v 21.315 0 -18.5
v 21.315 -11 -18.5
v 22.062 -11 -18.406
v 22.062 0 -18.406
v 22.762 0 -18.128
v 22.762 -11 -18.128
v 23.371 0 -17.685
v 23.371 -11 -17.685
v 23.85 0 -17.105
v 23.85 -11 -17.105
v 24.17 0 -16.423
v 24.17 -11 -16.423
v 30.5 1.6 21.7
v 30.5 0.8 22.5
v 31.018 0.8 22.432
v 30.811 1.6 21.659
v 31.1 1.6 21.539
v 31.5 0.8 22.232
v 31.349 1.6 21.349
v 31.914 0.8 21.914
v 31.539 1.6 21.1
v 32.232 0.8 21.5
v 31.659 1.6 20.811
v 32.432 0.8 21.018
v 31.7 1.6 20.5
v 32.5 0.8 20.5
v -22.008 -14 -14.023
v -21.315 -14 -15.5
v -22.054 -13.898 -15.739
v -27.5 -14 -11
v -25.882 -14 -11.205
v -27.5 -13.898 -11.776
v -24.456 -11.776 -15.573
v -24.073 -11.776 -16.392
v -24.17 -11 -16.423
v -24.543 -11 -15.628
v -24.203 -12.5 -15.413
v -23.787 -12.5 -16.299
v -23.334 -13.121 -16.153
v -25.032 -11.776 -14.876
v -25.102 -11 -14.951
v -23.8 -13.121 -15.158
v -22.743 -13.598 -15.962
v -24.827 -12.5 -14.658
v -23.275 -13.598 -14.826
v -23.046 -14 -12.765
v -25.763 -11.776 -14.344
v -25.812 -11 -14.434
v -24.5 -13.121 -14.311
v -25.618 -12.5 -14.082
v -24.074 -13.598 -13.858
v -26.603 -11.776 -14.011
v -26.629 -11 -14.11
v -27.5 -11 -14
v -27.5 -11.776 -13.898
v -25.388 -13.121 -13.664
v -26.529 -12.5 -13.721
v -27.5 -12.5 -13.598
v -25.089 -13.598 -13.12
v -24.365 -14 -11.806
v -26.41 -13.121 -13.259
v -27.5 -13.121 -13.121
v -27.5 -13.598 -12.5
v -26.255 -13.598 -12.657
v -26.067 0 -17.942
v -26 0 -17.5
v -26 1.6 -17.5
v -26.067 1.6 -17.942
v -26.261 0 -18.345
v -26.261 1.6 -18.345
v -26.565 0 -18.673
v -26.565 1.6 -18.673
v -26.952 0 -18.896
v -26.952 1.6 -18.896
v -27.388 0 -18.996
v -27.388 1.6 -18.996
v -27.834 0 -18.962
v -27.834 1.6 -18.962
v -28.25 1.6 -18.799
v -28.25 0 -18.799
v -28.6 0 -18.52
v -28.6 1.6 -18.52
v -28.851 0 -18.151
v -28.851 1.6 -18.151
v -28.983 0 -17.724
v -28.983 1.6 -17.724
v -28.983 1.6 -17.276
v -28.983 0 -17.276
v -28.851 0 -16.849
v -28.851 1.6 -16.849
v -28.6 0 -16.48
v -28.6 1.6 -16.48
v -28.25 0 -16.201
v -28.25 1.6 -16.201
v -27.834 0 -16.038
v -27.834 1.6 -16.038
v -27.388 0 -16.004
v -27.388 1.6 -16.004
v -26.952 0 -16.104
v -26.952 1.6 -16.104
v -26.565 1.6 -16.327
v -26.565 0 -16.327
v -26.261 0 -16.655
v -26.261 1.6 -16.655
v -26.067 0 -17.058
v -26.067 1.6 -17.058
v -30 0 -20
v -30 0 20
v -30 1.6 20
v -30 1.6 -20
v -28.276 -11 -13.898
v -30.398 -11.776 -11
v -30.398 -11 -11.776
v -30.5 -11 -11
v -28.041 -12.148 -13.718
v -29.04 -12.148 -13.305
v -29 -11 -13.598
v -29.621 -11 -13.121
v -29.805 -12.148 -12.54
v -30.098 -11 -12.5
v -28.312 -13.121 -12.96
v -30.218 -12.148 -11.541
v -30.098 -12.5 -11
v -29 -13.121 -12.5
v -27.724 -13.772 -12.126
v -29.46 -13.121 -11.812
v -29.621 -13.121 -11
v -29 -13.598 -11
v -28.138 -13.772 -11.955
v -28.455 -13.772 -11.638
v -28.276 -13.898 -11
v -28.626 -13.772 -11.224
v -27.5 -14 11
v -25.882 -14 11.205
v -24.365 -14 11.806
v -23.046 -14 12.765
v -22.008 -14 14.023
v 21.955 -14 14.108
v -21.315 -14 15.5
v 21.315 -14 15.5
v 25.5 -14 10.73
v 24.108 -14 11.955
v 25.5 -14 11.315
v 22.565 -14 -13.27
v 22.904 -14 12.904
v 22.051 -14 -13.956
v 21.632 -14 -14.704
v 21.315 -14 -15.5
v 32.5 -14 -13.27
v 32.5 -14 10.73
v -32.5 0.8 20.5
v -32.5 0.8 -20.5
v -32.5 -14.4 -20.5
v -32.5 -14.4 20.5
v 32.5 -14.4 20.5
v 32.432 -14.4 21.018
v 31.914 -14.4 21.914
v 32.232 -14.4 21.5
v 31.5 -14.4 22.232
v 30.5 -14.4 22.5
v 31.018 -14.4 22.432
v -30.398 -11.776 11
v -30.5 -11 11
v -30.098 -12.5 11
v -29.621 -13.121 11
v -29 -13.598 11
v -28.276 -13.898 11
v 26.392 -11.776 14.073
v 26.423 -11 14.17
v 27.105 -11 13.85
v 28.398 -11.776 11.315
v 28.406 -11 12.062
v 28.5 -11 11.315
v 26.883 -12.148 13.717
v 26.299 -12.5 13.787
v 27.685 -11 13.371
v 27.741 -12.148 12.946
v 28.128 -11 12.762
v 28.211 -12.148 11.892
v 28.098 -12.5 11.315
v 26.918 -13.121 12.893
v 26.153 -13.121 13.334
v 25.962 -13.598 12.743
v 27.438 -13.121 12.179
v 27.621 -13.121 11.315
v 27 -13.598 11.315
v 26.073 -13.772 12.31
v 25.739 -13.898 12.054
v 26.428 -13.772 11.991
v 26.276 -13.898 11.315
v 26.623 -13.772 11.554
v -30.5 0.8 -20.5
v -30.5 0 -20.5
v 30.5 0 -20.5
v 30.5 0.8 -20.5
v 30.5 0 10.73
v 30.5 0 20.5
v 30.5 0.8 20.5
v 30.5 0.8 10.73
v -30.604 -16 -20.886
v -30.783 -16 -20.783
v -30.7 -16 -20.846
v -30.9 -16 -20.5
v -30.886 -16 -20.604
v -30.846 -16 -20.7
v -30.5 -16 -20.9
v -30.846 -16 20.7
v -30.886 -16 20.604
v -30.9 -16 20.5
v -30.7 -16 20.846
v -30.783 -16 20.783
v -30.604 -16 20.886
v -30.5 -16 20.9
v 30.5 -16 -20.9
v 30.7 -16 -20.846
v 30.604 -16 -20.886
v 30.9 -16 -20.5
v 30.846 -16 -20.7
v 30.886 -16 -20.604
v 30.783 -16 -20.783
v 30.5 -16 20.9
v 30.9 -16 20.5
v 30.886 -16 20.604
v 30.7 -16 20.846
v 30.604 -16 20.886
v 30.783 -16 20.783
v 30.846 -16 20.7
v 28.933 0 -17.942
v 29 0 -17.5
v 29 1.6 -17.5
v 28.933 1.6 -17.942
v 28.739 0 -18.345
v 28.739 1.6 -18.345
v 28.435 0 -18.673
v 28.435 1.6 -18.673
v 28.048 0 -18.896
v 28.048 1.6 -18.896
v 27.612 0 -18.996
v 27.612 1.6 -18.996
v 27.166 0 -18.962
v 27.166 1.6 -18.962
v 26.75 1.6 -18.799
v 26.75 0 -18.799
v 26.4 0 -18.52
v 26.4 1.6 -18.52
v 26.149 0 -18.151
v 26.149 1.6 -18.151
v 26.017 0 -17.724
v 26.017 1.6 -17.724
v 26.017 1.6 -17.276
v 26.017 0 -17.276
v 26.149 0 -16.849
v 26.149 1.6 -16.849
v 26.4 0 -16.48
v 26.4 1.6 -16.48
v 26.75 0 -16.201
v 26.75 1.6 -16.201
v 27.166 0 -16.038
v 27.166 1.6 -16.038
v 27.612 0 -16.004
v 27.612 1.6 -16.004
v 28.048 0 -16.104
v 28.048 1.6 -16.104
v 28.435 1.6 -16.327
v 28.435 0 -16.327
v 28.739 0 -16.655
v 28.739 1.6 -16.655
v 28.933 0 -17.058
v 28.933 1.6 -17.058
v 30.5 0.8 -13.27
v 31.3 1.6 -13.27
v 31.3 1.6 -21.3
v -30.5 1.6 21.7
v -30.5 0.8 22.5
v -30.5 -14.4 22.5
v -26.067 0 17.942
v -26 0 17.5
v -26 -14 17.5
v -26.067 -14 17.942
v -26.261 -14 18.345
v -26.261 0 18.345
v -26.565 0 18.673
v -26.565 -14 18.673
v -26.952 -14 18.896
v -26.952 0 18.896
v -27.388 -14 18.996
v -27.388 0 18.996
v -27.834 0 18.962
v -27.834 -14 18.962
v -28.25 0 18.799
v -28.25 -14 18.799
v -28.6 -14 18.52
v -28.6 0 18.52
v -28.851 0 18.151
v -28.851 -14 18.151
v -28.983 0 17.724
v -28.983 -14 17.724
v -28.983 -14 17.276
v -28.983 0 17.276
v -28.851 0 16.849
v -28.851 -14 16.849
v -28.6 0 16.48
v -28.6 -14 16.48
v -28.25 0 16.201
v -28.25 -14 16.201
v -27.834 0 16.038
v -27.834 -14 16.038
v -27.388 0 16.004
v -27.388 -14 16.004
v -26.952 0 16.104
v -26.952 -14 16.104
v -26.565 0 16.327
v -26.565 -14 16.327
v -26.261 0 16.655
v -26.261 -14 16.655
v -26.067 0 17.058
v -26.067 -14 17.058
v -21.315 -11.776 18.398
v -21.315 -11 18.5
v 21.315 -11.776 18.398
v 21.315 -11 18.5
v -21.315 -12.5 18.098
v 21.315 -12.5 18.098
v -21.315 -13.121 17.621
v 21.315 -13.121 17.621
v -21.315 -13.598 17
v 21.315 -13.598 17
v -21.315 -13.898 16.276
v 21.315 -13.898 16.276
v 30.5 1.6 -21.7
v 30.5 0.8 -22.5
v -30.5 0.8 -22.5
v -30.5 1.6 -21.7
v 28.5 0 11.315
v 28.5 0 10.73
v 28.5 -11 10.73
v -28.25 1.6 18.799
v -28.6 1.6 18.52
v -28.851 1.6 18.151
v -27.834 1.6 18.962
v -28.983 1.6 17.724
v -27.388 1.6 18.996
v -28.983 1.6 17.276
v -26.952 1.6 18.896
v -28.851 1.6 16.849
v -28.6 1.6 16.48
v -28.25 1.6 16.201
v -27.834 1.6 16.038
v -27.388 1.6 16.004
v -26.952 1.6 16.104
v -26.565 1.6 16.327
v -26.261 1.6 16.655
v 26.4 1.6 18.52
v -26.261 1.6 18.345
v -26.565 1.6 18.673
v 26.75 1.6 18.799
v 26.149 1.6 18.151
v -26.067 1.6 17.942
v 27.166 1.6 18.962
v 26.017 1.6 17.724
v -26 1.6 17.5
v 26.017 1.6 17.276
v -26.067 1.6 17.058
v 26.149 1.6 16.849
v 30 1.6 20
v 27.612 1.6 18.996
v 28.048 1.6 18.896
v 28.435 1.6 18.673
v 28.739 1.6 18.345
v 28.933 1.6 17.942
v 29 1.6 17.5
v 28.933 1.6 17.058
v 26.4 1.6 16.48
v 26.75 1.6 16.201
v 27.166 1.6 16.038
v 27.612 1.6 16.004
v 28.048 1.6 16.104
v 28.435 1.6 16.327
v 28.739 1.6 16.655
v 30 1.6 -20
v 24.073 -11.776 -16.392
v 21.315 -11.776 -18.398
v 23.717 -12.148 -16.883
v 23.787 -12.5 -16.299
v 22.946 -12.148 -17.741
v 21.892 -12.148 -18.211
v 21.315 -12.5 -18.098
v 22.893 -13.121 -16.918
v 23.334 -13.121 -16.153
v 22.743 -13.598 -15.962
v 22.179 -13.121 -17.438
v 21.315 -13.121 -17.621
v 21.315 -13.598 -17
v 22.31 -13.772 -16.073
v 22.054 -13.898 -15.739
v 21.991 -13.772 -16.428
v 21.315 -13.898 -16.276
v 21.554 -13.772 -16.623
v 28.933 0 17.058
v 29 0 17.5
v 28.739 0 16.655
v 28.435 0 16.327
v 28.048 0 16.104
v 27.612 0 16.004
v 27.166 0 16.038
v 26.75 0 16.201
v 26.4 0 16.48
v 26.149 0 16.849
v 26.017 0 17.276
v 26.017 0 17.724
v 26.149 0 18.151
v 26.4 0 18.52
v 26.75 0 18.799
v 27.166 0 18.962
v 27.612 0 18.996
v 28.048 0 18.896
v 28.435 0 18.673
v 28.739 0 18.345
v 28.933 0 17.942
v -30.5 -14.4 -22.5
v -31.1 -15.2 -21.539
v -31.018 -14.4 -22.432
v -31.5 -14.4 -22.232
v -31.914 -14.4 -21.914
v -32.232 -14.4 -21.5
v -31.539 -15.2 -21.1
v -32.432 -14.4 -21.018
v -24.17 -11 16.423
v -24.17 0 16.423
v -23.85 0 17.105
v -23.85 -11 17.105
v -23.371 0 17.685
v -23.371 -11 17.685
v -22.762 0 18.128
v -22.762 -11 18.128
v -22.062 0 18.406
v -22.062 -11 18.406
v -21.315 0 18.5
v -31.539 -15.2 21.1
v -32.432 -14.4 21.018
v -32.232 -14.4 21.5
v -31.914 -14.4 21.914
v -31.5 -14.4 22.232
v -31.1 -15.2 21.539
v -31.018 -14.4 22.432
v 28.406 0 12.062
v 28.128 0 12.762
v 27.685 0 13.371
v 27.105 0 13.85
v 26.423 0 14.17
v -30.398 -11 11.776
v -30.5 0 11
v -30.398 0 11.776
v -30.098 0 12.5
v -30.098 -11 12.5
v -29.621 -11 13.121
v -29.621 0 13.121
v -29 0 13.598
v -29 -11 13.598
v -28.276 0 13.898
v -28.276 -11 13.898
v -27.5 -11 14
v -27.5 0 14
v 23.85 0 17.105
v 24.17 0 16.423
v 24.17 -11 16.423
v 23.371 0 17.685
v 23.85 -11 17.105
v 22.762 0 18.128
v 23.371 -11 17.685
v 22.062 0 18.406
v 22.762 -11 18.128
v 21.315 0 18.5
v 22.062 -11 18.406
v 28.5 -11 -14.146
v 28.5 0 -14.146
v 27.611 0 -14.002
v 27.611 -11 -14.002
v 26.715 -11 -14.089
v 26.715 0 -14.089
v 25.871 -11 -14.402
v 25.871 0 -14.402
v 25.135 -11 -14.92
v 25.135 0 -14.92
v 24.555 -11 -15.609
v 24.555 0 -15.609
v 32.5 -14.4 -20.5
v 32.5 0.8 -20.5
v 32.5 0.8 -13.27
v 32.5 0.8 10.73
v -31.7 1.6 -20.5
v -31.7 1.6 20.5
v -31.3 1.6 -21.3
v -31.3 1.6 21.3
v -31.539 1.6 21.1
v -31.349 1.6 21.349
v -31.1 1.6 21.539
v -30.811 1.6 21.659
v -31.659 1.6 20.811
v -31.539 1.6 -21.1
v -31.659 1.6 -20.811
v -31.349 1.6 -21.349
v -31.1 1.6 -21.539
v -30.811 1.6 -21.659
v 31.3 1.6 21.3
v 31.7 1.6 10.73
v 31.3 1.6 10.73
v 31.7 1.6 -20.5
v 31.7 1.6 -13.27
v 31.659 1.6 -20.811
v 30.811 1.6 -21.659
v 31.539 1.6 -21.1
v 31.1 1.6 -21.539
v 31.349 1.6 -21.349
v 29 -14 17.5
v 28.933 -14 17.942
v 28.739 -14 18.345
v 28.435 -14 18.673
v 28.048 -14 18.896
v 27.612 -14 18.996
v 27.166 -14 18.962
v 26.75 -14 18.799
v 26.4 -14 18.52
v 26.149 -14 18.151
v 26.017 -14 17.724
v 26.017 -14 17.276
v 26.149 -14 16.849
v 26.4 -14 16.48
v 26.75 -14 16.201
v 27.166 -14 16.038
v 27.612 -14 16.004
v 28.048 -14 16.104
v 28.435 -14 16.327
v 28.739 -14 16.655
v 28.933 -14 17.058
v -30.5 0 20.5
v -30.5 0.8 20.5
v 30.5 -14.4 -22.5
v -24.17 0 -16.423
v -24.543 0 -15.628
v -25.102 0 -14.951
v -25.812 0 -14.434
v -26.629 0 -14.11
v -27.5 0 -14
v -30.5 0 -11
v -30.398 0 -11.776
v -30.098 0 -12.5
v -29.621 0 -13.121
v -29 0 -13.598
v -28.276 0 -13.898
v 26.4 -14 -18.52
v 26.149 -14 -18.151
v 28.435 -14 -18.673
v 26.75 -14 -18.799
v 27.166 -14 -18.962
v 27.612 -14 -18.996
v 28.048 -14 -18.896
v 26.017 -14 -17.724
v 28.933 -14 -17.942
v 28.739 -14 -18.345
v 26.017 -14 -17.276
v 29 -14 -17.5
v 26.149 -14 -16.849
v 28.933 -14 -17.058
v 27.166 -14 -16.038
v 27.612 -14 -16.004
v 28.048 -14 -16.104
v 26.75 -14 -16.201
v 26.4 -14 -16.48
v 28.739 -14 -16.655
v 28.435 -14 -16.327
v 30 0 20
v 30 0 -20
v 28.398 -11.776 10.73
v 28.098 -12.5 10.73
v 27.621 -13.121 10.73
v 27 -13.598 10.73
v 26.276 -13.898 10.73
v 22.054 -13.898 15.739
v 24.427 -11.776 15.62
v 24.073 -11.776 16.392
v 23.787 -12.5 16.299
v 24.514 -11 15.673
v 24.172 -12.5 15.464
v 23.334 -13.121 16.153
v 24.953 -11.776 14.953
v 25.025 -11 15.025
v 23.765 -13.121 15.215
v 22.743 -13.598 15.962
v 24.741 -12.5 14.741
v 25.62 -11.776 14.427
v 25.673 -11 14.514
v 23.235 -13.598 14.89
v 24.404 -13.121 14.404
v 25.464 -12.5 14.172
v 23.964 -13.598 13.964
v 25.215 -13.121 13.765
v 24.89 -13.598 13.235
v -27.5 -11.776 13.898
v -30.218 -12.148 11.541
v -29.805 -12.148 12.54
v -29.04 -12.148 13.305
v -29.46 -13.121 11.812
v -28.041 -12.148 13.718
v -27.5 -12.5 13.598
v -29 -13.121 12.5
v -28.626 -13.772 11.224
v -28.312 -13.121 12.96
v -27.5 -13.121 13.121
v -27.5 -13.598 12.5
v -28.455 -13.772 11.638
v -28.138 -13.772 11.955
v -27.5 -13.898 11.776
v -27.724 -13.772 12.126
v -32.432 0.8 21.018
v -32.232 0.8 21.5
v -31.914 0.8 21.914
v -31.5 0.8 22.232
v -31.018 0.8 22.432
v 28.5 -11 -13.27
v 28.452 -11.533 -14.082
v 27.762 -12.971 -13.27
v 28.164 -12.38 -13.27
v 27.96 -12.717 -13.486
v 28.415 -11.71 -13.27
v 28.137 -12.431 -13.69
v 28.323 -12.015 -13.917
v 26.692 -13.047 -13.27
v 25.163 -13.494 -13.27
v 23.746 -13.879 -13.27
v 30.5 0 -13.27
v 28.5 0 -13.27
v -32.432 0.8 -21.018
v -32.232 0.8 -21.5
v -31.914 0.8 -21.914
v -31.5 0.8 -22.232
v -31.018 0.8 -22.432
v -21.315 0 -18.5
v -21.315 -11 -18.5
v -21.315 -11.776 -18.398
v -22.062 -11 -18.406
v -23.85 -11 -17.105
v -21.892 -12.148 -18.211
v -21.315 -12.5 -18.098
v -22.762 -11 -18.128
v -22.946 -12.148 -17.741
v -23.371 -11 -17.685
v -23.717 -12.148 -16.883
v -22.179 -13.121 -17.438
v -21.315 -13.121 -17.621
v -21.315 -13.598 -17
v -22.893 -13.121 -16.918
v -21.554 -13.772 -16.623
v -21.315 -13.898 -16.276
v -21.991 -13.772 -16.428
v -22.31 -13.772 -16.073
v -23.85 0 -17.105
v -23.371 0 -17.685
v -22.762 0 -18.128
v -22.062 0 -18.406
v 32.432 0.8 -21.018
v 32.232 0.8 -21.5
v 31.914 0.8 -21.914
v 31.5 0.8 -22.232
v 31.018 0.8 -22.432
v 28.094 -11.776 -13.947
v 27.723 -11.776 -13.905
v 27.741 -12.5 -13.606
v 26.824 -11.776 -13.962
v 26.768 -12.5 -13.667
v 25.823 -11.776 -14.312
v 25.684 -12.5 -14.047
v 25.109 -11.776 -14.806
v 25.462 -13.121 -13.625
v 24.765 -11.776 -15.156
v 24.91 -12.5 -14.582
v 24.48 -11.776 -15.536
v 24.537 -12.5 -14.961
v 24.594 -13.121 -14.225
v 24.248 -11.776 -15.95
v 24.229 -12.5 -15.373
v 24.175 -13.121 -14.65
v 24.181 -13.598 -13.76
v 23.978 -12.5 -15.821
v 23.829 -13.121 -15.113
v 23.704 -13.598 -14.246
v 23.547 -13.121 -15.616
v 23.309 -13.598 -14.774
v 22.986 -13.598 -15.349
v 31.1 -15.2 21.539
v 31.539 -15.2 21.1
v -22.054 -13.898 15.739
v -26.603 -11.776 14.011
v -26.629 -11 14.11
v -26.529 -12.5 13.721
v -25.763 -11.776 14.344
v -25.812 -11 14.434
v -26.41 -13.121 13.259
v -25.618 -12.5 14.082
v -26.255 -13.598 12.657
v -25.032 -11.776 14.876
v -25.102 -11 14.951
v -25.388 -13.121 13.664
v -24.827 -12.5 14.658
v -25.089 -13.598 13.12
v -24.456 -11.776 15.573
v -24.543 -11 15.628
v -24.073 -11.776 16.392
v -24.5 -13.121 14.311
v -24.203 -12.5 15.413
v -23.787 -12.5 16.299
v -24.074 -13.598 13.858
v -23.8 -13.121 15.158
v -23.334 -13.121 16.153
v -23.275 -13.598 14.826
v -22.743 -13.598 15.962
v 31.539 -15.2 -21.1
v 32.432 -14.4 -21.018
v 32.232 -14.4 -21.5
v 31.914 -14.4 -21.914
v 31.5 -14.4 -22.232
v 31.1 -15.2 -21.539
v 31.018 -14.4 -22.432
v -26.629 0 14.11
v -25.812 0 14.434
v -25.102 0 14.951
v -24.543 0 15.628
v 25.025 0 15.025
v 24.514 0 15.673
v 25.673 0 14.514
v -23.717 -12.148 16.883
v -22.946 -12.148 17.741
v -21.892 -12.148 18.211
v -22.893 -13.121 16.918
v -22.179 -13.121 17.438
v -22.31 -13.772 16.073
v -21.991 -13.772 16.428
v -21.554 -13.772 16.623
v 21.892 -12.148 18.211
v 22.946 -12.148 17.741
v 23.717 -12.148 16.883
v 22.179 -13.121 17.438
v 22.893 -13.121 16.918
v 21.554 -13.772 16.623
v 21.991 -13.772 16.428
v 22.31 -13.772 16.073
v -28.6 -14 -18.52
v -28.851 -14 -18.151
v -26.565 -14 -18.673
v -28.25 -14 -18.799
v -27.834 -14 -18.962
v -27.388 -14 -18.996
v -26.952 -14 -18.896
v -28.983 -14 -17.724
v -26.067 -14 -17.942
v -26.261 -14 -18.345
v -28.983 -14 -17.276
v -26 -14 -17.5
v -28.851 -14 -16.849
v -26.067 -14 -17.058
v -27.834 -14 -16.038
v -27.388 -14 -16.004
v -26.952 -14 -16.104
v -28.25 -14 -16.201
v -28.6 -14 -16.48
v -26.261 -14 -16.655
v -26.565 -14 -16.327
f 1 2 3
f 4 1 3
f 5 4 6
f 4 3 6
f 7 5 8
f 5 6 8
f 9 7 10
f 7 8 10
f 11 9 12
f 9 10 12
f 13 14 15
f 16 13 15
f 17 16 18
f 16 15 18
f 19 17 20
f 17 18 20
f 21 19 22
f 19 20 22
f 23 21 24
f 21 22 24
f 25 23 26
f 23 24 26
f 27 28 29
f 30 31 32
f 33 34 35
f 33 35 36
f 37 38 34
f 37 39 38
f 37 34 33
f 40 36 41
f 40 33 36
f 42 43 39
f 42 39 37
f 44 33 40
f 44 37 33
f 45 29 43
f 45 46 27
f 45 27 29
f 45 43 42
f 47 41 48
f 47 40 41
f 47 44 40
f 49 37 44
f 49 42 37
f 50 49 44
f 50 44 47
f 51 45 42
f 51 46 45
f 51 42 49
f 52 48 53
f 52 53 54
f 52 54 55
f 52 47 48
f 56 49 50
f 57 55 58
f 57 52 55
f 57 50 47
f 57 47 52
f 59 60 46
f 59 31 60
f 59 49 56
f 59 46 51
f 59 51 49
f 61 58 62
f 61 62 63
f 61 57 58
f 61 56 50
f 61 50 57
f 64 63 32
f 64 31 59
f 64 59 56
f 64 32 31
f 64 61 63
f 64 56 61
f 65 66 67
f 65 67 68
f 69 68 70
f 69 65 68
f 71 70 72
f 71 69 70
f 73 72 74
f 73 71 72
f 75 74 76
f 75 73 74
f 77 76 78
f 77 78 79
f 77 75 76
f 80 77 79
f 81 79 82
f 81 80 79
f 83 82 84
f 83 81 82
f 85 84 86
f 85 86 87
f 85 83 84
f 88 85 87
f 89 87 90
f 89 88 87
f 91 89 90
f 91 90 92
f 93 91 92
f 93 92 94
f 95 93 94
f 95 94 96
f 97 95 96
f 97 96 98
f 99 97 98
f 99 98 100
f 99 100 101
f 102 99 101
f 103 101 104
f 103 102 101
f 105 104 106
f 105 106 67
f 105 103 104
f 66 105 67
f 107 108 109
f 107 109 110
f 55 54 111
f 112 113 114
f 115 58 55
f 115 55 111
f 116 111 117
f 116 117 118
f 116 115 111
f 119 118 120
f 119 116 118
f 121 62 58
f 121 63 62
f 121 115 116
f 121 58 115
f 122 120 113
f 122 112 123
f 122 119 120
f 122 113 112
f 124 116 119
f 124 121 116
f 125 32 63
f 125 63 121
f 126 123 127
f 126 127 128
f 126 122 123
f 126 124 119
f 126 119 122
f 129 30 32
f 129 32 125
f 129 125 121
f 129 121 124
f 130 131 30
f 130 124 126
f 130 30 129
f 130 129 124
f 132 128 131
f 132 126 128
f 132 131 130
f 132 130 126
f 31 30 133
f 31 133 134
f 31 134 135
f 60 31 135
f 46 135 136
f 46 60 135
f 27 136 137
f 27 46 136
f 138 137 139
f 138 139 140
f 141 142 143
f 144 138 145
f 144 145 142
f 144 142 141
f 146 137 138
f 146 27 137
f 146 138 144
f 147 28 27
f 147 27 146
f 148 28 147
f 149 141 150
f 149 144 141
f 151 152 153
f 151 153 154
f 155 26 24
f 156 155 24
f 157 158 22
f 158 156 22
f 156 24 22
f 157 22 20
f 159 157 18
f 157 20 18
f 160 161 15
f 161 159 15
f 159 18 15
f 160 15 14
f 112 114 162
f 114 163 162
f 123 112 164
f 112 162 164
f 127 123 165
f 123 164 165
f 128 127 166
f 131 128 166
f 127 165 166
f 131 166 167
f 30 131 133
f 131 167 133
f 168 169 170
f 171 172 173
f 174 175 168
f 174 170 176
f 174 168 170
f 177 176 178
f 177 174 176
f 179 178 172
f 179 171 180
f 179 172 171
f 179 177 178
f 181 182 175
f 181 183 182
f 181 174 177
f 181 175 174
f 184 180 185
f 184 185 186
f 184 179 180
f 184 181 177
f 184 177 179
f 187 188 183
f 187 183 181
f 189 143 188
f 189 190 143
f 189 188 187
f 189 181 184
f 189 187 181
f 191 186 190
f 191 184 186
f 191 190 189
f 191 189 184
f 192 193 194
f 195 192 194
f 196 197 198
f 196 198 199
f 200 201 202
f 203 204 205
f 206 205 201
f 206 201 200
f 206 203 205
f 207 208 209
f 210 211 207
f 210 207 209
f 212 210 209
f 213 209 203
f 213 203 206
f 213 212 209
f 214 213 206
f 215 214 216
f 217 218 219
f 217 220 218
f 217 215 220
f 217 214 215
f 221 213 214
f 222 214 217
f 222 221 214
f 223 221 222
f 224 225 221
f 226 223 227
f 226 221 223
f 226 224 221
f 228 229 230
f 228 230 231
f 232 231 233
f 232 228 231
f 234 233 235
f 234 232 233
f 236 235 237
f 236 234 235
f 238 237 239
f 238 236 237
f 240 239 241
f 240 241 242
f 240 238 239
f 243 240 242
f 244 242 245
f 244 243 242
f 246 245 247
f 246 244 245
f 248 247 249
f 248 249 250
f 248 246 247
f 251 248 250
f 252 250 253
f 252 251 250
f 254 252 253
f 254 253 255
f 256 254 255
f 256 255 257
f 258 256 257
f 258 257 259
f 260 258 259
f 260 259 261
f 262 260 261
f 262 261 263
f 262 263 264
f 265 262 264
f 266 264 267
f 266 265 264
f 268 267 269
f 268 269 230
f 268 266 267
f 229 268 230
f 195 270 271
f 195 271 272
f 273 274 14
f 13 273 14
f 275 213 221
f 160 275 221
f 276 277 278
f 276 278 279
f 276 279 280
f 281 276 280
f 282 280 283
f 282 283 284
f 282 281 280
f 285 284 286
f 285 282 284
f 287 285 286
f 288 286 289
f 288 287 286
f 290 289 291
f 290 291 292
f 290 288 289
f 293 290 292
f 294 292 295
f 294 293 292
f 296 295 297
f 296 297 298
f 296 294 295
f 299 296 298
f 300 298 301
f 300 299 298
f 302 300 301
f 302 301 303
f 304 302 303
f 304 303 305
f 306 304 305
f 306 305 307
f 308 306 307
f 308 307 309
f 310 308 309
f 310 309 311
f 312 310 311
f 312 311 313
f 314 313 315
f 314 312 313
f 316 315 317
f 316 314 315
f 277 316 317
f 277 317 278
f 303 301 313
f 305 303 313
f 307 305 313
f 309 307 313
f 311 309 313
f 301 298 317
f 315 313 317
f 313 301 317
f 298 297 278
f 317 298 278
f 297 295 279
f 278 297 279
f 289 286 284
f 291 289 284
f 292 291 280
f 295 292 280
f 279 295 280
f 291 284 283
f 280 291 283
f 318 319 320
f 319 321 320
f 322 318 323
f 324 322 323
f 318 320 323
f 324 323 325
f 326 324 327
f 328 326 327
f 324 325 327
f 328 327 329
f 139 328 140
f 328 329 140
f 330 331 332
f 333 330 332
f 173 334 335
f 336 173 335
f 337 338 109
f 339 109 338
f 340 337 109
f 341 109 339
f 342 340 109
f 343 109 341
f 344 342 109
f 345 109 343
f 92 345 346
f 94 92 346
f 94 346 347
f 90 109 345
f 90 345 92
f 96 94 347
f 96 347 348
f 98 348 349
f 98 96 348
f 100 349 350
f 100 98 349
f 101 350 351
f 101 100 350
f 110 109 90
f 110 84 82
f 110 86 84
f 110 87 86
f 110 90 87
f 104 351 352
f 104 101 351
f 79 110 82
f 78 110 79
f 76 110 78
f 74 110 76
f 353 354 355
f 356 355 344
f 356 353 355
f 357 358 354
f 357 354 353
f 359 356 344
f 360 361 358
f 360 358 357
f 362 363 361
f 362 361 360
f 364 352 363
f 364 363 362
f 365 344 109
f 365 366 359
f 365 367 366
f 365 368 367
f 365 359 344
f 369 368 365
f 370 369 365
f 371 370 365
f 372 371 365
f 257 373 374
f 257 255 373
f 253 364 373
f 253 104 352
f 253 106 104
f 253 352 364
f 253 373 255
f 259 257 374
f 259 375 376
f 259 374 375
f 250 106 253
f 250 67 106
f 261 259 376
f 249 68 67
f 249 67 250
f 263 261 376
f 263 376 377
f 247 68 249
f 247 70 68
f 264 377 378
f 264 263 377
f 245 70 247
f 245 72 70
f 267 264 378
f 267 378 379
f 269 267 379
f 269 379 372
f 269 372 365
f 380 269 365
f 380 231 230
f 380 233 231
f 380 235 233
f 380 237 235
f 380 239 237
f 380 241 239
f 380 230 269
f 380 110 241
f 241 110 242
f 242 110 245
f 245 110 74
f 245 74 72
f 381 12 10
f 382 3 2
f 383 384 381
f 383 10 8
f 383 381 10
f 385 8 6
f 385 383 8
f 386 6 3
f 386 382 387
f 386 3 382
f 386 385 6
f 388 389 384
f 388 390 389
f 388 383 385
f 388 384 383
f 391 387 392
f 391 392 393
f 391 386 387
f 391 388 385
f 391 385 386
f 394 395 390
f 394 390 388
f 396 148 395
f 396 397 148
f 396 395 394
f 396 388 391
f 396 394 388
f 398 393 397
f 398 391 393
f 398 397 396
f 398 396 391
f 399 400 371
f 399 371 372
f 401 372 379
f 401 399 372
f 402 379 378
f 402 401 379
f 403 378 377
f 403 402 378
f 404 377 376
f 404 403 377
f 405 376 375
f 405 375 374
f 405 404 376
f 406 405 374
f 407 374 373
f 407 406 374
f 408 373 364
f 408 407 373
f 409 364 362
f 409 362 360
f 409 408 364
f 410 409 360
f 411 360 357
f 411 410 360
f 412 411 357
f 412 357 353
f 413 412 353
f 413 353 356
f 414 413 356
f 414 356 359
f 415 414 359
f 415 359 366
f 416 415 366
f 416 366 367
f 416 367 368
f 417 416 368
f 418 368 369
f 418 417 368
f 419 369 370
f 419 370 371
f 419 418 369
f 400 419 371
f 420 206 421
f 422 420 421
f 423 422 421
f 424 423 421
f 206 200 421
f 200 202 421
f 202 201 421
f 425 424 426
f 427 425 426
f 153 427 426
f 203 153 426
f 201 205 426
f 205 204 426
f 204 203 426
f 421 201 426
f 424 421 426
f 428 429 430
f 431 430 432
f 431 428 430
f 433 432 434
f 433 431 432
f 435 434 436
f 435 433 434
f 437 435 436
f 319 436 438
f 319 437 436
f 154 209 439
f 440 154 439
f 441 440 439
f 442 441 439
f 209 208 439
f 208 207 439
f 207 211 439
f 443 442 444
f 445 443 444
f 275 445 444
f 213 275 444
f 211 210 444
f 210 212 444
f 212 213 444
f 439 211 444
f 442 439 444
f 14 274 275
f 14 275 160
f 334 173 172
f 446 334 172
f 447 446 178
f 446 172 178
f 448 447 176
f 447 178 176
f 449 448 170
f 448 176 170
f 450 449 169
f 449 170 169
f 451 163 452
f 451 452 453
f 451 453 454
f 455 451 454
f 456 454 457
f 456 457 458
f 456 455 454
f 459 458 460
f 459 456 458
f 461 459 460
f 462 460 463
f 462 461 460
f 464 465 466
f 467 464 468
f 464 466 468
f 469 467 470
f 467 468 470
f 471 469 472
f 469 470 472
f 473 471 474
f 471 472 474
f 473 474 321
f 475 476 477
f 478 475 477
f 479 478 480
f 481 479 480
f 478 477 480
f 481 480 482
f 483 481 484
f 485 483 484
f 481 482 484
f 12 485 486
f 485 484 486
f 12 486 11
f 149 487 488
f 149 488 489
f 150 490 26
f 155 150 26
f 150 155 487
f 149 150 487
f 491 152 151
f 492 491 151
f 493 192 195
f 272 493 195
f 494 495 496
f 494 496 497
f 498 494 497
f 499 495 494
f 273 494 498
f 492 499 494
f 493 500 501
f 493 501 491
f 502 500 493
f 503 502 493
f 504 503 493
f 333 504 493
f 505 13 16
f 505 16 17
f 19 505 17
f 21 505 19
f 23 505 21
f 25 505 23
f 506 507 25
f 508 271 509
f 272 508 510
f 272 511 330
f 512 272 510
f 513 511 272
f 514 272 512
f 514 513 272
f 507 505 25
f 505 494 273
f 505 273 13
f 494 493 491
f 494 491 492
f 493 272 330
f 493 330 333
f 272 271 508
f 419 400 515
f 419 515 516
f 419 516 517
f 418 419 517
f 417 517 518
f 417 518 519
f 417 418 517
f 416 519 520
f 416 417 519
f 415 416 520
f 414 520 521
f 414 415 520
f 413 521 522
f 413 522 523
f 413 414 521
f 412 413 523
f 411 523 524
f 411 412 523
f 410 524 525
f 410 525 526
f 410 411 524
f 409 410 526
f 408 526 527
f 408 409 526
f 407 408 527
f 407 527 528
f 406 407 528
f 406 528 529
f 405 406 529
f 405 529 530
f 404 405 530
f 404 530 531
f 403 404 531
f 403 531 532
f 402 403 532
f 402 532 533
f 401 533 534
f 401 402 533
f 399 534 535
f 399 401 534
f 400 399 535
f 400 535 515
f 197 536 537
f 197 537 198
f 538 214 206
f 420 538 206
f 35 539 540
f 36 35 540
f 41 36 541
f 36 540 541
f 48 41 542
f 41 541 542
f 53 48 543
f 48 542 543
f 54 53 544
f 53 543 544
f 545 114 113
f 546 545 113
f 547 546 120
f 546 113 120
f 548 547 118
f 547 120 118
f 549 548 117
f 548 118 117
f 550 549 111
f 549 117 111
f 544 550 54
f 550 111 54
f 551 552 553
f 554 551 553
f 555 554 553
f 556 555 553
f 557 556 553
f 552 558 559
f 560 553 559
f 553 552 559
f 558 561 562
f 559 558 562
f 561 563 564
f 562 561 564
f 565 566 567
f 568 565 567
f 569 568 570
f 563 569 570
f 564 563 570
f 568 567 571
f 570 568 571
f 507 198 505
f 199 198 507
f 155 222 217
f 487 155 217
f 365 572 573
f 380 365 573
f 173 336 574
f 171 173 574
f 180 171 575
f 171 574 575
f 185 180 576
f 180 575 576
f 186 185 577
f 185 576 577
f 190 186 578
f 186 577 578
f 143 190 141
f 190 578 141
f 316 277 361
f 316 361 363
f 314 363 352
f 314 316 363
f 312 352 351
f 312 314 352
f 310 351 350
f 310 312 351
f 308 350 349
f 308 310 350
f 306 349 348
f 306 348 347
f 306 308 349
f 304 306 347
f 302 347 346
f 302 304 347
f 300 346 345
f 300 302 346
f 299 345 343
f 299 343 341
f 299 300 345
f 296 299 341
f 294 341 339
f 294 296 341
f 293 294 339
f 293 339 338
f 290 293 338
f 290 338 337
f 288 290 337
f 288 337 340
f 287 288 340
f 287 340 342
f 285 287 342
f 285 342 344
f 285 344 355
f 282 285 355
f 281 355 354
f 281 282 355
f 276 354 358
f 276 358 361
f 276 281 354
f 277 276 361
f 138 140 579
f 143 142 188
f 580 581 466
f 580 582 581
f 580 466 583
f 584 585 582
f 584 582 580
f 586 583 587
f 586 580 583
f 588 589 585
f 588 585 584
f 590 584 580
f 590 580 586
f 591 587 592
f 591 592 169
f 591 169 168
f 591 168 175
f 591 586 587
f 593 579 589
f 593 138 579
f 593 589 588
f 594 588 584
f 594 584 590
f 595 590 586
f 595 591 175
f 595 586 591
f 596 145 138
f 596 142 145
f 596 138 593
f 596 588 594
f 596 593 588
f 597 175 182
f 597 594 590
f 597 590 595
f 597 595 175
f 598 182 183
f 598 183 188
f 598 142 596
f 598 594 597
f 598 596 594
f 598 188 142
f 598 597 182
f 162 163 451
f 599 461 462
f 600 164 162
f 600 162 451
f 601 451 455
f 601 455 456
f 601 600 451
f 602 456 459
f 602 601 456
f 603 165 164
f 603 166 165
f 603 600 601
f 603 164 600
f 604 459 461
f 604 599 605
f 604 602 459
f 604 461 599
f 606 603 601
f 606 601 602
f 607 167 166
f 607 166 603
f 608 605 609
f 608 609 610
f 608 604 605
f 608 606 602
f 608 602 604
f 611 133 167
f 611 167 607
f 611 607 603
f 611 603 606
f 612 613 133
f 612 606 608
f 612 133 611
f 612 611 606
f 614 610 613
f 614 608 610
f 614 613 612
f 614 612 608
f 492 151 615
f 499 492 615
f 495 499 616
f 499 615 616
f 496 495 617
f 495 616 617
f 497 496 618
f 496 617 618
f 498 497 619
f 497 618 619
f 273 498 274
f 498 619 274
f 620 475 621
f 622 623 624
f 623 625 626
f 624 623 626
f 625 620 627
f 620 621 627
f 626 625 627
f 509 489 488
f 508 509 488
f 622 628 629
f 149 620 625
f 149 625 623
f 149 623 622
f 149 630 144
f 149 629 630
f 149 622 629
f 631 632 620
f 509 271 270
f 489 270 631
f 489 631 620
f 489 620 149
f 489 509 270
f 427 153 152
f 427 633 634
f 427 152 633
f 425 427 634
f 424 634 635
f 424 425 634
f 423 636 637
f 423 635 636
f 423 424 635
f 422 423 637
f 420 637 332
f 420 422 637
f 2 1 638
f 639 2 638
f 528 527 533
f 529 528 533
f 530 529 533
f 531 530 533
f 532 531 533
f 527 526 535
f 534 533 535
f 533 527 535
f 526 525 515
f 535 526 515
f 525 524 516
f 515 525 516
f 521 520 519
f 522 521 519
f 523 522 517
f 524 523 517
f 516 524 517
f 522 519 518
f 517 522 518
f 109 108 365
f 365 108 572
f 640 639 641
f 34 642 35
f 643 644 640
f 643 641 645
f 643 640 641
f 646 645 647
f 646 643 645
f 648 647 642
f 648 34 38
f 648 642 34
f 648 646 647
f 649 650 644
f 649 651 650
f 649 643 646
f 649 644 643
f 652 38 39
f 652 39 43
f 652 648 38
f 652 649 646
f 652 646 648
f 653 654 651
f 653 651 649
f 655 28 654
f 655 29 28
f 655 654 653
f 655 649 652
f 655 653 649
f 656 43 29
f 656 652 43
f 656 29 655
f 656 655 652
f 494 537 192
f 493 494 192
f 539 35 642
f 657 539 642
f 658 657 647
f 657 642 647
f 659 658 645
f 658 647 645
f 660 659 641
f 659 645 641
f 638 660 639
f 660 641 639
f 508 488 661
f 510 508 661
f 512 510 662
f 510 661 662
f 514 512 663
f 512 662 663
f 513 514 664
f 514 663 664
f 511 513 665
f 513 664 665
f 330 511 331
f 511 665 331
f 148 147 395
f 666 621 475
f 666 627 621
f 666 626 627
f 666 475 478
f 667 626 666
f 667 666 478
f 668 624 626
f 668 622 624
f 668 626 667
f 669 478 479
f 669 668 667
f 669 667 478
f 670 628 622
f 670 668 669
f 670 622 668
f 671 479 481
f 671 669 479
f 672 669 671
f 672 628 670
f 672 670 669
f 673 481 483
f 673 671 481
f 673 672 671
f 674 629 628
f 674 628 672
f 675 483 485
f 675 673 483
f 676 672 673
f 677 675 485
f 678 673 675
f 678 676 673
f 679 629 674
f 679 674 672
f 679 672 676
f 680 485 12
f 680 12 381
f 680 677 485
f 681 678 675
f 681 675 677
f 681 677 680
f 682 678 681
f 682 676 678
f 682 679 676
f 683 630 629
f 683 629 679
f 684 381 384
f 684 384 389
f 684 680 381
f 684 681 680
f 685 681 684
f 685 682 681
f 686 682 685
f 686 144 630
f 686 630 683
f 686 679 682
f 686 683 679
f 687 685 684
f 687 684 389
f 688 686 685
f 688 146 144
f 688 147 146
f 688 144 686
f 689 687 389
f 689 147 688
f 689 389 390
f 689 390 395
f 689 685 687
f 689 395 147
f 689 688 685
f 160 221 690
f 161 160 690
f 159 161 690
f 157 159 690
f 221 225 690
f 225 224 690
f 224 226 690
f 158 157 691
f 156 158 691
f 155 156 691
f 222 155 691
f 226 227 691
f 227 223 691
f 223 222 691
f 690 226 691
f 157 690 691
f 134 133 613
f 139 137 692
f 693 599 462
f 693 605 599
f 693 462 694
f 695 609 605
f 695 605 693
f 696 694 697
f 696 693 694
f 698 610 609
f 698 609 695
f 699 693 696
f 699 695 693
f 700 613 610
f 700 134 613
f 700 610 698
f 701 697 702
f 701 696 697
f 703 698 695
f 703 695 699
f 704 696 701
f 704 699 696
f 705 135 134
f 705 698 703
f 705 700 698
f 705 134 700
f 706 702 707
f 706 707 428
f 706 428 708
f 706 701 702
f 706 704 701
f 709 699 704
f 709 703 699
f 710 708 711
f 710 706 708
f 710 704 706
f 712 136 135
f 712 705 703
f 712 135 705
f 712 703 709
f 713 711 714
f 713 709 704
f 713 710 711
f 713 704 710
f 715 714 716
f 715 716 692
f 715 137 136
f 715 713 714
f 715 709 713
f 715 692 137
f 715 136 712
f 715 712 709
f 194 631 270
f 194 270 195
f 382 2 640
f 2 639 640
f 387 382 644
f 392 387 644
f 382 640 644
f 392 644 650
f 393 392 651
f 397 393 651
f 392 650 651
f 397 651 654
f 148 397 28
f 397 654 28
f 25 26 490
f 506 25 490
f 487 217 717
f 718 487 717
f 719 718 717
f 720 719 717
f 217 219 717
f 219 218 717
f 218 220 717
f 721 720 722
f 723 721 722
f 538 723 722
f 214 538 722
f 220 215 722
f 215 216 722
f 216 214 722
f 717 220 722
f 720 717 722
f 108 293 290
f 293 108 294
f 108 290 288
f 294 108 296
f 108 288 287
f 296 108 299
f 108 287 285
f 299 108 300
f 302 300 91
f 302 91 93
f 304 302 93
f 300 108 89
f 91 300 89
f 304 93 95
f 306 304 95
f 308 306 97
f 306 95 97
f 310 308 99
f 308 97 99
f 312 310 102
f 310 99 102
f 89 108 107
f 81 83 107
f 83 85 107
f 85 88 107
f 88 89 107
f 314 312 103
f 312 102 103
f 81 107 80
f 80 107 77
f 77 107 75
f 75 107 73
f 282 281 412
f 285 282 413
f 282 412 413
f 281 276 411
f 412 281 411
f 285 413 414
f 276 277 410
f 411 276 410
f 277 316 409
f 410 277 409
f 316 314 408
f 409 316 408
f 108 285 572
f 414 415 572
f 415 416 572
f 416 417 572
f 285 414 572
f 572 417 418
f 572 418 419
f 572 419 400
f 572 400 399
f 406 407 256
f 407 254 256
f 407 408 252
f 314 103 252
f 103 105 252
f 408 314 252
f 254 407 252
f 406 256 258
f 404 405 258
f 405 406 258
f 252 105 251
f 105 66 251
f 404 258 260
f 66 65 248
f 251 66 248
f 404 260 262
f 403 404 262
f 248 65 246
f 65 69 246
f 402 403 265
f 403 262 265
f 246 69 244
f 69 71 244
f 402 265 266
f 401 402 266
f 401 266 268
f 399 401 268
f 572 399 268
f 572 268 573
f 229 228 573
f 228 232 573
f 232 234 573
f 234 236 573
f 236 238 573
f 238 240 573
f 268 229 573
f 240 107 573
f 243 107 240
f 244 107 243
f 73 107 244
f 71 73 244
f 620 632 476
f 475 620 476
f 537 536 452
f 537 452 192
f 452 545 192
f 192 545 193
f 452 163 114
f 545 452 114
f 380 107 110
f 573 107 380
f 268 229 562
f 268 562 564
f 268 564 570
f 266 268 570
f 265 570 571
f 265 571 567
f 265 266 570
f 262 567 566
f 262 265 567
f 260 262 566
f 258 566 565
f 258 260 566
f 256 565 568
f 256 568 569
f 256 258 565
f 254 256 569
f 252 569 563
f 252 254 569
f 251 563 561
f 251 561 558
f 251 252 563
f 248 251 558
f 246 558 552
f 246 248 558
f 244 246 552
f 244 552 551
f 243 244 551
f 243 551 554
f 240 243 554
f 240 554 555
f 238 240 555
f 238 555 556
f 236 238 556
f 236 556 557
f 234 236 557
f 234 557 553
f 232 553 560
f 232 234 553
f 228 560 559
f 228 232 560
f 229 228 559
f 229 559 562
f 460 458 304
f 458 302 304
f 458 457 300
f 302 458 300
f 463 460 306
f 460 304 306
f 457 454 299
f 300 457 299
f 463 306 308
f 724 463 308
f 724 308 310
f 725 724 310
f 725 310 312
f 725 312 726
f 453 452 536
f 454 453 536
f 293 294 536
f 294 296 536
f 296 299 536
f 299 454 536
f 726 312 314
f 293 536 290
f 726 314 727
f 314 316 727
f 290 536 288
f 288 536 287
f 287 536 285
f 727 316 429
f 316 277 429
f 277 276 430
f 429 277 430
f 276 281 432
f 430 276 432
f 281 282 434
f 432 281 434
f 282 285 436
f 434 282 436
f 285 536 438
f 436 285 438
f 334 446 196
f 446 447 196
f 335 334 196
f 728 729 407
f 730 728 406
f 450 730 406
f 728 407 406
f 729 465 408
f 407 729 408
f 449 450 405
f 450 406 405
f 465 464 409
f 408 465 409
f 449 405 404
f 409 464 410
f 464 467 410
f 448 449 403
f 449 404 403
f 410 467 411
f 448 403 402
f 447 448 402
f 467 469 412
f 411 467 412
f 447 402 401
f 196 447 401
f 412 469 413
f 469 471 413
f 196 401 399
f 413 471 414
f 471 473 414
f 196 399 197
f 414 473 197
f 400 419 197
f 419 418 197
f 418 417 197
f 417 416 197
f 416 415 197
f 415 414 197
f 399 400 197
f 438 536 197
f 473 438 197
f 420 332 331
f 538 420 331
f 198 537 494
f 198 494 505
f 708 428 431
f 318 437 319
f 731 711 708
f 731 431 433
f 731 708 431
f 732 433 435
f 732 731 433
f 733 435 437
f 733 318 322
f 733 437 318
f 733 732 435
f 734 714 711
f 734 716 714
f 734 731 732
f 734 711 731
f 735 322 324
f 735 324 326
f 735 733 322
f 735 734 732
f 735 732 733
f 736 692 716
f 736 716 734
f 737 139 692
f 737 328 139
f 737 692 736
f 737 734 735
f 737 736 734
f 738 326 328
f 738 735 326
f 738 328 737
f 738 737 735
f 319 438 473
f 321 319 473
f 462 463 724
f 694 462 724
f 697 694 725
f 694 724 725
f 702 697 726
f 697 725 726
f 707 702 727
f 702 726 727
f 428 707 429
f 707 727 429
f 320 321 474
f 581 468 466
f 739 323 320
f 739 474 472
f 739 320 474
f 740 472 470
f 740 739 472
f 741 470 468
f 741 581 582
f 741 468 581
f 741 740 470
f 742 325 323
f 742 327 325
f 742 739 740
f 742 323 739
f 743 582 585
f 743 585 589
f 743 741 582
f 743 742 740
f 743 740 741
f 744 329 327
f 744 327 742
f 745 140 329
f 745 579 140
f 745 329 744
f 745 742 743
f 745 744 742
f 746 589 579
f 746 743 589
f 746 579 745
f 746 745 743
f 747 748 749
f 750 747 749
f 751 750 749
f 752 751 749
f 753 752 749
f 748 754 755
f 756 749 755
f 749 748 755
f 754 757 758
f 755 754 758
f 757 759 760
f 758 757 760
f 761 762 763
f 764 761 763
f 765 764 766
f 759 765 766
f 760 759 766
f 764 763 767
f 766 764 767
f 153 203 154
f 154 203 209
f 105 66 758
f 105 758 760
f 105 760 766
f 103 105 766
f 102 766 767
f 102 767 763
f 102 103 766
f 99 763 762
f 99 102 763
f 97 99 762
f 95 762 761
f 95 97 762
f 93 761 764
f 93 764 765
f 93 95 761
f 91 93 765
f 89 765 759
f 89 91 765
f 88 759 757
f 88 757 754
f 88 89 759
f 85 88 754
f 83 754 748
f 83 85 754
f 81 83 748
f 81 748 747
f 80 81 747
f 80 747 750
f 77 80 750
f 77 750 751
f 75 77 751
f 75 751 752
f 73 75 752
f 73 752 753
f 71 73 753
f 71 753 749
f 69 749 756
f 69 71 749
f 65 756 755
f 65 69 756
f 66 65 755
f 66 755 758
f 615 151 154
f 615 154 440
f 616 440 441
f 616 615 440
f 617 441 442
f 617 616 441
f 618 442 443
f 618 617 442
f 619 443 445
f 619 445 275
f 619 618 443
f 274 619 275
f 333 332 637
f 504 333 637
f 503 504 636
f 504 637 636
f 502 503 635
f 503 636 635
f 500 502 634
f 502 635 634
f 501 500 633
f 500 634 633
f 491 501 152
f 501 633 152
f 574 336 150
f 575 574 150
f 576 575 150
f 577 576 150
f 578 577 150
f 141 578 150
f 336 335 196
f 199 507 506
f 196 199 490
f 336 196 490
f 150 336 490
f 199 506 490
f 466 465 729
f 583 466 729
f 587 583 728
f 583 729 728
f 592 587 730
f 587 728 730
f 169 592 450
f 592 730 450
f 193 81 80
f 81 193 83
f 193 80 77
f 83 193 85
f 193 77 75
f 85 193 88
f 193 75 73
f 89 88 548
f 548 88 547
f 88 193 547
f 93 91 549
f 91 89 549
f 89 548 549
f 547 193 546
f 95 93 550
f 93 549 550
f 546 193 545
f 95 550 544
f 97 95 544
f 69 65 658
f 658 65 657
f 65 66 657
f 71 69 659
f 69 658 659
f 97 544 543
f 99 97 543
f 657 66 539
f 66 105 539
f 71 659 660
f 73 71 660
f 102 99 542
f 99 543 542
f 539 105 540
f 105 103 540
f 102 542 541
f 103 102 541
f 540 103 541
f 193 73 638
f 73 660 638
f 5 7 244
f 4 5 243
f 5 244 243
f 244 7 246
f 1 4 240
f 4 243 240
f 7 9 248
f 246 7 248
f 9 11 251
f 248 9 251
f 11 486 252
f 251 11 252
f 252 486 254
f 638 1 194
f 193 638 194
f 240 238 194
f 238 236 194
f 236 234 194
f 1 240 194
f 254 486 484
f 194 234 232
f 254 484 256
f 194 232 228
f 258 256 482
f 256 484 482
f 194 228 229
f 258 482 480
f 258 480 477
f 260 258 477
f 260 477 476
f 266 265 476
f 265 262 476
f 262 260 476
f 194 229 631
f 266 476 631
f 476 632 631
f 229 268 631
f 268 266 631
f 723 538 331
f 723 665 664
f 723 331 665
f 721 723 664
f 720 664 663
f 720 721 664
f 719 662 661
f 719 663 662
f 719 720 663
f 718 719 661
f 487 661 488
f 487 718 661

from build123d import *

# Parameters (mm, degrees)
SKETCH1_W           = 60
SKETCH1_H           = 40
SKETCH1_R           = 1.5
BOSS_EXTRUDE1_DEPTH = 1.6
SKETCH2_W           = 65
SKETCH2_H           = 45
SKETCH2_R           = 1.5
BOSS_EXTRUDE2_DEPTH = 14
SKETCH3_W           = 65
SKETCH3_H           = 45
SKETCH3_W_2         = 61
SKETCH3_H_2         = 41
BOSS_EXTRUDE3_DEPTH = 1.6
SKETCH4_W           = 65
SKETCH4_H           = 45
BOSS_EXTRUDE4_DEPTH = 2
FILLET3_R           = 2
FILLET1_R           = 3
FILLET2_R           = 3
CHAMFER1_SIZE       = 1.6
CHAMFER2_SIZE       = 0.8
SKETCH5_W           = 32.5
SKETCH5_H           = 24
CUT_EXTRUDE1_DEPTH  = 15.6


with BuildPart() as part:
    # Sketch1 → Boss-Extrude1 (new body)
    with BuildSketch(Plane(origin=(0, 0, 0), x_dir=(1, 0, 0), z_dir=(0, 1, 0))):
        Rectangle(SKETCH1_W, SKETCH1_H)
        with Locations((27.5, 17.5)):
            Circle(SKETCH1_R, mode=Mode.SUBTRACT)
        with Locations((-27.5, 17.5)):
            Circle(SKETCH1_R, mode=Mode.SUBTRACT)
        with Locations((-27.5, -17.5)):
            Circle(SKETCH1_R, mode=Mode.SUBTRACT)
        with Locations((27.5, -17.5)):
            Circle(SKETCH1_R, mode=Mode.SUBTRACT)
    extrude(amount=BOSS_EXTRUDE1_DEPTH)


with BuildPart() as body_2:
    # Sketch2 → Boss-Extrude2 (new body)
    with BuildSketch(Plane.XZ):
        Rectangle(SKETCH2_W, SKETCH2_H)
        with Locations((-27.5, 17.5)):
            Circle(SKETCH2_R, mode=Mode.SUBTRACT)
        with Locations((27.5, 17.5)):
            Circle(SKETCH2_R, mode=Mode.SUBTRACT)
        with Locations((27.5, -17.5)):
            Circle(SKETCH2_R, mode=Mode.SUBTRACT)
        with Locations((-27.5, -17.5)):
            Circle(SKETCH2_R, mode=Mode.SUBTRACT)
        with BuildLine():
            Line((-24.145898034, 18.5), (24.145898034, 18.5))
            ThreePointArc((24.145898034, 18.5), (25.025126266, 15.025126266), (28.5, 14.145898034))
            Line((28.5, 14.145898034), (28.5, -14.145898034))
            ThreePointArc((28.5, -14.145898034), (25.025126266, -15.025126266), (24.145898034, -18.5))
            Line((24.145898034, -18.5), (-24.145898034, -18.5))
            ThreePointArc((-24.145898034, -18.5), (-26.08747217, -14.297693779), (-30.5, -15.697224362))
            Line((-30.5, -15.697224362), (-30.5, 15.697224362))
            ThreePointArc((-30.5, 15.697224362), (-26.08747217, 14.297693779), (-24.145898034, 18.5))
        make_face(mode=Mode.SUBTRACT)
    extrude(amount=BOSS_EXTRUDE2_DEPTH)

    # Sketch3 → Boss-Extrude3 (add)
    with BuildSketch(Plane(origin=(0, 0, 0), x_dir=(1, 0, 0), z_dir=(0, 1, 0))):
        Rectangle(SKETCH3_W, SKETCH3_H)
        Rectangle(SKETCH3_W_2, SKETCH3_H_2, mode=Mode.SUBTRACT)
    extrude(amount=BOSS_EXTRUDE3_DEPTH)

    # Sketch4 → Boss-Extrude4 (add)
    with BuildSketch(Plane.XZ.offset(14)):
        Rectangle(SKETCH4_W, SKETCH4_H)
    extrude(amount=BOSS_EXTRUDE4_DEPTH)

    # Fillet3
    fillet3_edges = [body_2.edges().sort_by_distance(p)[0] for p in [
        (-32.5, -7.2, -22.5),
        (-32.5, -7.2, 22.5),
        (32.5, -7.2, 22.5),
        (32.5, -7.2, -22.5),
    ]]
    fillet(fillet3_edges, radius=FILLET3_R)

    # Fillet1
    fillet1_edges = [body_2.edges().sort_by_distance(p)[0] for p in [
        (-24.145898034, -7, 18.5),
        (-30.5, -7, 15.697224362),
        (-30.5, -7, -15.697224362),
        (-24.145898034, -7, -18.5),
        (24.145898034, -7, -18.5),
        (28.5, -7, 14.145898034),
        (24.145898034, -7, 18.5),
    ]]
    fillet(fillet1_edges, radius=FILLET1_R)

    # Fillet2
    fillet2_edges = [body_2.edges().sort_by_distance(p)[0] for p in [
        (0, -14, -18.5),
        (25.870937464, -14, -14.402233828),
        (-30.5, -14, 0),
        (-25.440780581, -14, 14.66987361),
        (0, -14, 18.5),
        (25.025126266, -14, 15.025126266),
        (-25.440780581, -14, -14.66987361),
        (-23.080386778, -14, -17.92582262),
        (-29.621320344, -14, -13.121320344),
        (-29.621320344, -14, 13.121320344),
        (-23.080386778, -14, 17.92582262),
        (23.080386778, -14, 17.92582262),
        (27.92582262, -14, 13.080386778),
        (23.080386778, -14, -17.92582262),
        (28.5, -14, -1.415278236),
    ]]
    fillet(fillet2_edges, radius=FILLET2_R)

    # Chamfer1
    chamfer1_edges = [body_2.edges().sort_by_distance(p)[0] for p in [
        (0, -16, 22.5),
        (32.5, -16, 0),
        (0, -16, -22.5),
        (-32.5, -16, 0),
        (-31.914213562, -16, -21.914213562),
        (31.914213562, -16, -21.914213562),
        (-31.914213562, -16, 21.914213562),
        (31.914213562, -16, 21.914213562),
    ]]
    chamfer(chamfer1_edges, length=CHAMFER1_SIZE)

    # Chamfer2
    chamfer2_edges = [body_2.edges().sort_by_distance(p)[0] for p in [
        (0, 1.6, 22.5),
        (0, 1.6, -22.5),
        (-32.5, 1.6, 0),
        (32.5, 1.6, 0),
        (-31.914213562, 1.6, -21.914213562),
        (31.914213562, 1.6, -21.914213562),
        (-31.914213562, 1.6, 21.914213562),
        (31.914213562, 1.6, 21.914213562),
        (0, 1.6, -20.5),
        (-30.5, 1.6, 0),
        (0, 1.6, 20.5),
        (30.5, 1.6, 0),
    ]]
    chamfer(chamfer2_edges, length=CHAMFER2_SIZE)

    # Sketch5 → Cut-Extrude1 (cut)
    with BuildSketch(Plane(origin=(0, 1.6, 0), x_dir=(1, 0, 0), z_dir=(0, 1, 0))):
        with Locations((16.25, 1.27)):
            Rectangle(SKETCH5_W, SKETCH5_H)
    extrude(amount=-CUT_EXTRUDE1_DEPTH, mode=Mode.SUBTRACT)


solid = Compound([part.part, body_2.part])
